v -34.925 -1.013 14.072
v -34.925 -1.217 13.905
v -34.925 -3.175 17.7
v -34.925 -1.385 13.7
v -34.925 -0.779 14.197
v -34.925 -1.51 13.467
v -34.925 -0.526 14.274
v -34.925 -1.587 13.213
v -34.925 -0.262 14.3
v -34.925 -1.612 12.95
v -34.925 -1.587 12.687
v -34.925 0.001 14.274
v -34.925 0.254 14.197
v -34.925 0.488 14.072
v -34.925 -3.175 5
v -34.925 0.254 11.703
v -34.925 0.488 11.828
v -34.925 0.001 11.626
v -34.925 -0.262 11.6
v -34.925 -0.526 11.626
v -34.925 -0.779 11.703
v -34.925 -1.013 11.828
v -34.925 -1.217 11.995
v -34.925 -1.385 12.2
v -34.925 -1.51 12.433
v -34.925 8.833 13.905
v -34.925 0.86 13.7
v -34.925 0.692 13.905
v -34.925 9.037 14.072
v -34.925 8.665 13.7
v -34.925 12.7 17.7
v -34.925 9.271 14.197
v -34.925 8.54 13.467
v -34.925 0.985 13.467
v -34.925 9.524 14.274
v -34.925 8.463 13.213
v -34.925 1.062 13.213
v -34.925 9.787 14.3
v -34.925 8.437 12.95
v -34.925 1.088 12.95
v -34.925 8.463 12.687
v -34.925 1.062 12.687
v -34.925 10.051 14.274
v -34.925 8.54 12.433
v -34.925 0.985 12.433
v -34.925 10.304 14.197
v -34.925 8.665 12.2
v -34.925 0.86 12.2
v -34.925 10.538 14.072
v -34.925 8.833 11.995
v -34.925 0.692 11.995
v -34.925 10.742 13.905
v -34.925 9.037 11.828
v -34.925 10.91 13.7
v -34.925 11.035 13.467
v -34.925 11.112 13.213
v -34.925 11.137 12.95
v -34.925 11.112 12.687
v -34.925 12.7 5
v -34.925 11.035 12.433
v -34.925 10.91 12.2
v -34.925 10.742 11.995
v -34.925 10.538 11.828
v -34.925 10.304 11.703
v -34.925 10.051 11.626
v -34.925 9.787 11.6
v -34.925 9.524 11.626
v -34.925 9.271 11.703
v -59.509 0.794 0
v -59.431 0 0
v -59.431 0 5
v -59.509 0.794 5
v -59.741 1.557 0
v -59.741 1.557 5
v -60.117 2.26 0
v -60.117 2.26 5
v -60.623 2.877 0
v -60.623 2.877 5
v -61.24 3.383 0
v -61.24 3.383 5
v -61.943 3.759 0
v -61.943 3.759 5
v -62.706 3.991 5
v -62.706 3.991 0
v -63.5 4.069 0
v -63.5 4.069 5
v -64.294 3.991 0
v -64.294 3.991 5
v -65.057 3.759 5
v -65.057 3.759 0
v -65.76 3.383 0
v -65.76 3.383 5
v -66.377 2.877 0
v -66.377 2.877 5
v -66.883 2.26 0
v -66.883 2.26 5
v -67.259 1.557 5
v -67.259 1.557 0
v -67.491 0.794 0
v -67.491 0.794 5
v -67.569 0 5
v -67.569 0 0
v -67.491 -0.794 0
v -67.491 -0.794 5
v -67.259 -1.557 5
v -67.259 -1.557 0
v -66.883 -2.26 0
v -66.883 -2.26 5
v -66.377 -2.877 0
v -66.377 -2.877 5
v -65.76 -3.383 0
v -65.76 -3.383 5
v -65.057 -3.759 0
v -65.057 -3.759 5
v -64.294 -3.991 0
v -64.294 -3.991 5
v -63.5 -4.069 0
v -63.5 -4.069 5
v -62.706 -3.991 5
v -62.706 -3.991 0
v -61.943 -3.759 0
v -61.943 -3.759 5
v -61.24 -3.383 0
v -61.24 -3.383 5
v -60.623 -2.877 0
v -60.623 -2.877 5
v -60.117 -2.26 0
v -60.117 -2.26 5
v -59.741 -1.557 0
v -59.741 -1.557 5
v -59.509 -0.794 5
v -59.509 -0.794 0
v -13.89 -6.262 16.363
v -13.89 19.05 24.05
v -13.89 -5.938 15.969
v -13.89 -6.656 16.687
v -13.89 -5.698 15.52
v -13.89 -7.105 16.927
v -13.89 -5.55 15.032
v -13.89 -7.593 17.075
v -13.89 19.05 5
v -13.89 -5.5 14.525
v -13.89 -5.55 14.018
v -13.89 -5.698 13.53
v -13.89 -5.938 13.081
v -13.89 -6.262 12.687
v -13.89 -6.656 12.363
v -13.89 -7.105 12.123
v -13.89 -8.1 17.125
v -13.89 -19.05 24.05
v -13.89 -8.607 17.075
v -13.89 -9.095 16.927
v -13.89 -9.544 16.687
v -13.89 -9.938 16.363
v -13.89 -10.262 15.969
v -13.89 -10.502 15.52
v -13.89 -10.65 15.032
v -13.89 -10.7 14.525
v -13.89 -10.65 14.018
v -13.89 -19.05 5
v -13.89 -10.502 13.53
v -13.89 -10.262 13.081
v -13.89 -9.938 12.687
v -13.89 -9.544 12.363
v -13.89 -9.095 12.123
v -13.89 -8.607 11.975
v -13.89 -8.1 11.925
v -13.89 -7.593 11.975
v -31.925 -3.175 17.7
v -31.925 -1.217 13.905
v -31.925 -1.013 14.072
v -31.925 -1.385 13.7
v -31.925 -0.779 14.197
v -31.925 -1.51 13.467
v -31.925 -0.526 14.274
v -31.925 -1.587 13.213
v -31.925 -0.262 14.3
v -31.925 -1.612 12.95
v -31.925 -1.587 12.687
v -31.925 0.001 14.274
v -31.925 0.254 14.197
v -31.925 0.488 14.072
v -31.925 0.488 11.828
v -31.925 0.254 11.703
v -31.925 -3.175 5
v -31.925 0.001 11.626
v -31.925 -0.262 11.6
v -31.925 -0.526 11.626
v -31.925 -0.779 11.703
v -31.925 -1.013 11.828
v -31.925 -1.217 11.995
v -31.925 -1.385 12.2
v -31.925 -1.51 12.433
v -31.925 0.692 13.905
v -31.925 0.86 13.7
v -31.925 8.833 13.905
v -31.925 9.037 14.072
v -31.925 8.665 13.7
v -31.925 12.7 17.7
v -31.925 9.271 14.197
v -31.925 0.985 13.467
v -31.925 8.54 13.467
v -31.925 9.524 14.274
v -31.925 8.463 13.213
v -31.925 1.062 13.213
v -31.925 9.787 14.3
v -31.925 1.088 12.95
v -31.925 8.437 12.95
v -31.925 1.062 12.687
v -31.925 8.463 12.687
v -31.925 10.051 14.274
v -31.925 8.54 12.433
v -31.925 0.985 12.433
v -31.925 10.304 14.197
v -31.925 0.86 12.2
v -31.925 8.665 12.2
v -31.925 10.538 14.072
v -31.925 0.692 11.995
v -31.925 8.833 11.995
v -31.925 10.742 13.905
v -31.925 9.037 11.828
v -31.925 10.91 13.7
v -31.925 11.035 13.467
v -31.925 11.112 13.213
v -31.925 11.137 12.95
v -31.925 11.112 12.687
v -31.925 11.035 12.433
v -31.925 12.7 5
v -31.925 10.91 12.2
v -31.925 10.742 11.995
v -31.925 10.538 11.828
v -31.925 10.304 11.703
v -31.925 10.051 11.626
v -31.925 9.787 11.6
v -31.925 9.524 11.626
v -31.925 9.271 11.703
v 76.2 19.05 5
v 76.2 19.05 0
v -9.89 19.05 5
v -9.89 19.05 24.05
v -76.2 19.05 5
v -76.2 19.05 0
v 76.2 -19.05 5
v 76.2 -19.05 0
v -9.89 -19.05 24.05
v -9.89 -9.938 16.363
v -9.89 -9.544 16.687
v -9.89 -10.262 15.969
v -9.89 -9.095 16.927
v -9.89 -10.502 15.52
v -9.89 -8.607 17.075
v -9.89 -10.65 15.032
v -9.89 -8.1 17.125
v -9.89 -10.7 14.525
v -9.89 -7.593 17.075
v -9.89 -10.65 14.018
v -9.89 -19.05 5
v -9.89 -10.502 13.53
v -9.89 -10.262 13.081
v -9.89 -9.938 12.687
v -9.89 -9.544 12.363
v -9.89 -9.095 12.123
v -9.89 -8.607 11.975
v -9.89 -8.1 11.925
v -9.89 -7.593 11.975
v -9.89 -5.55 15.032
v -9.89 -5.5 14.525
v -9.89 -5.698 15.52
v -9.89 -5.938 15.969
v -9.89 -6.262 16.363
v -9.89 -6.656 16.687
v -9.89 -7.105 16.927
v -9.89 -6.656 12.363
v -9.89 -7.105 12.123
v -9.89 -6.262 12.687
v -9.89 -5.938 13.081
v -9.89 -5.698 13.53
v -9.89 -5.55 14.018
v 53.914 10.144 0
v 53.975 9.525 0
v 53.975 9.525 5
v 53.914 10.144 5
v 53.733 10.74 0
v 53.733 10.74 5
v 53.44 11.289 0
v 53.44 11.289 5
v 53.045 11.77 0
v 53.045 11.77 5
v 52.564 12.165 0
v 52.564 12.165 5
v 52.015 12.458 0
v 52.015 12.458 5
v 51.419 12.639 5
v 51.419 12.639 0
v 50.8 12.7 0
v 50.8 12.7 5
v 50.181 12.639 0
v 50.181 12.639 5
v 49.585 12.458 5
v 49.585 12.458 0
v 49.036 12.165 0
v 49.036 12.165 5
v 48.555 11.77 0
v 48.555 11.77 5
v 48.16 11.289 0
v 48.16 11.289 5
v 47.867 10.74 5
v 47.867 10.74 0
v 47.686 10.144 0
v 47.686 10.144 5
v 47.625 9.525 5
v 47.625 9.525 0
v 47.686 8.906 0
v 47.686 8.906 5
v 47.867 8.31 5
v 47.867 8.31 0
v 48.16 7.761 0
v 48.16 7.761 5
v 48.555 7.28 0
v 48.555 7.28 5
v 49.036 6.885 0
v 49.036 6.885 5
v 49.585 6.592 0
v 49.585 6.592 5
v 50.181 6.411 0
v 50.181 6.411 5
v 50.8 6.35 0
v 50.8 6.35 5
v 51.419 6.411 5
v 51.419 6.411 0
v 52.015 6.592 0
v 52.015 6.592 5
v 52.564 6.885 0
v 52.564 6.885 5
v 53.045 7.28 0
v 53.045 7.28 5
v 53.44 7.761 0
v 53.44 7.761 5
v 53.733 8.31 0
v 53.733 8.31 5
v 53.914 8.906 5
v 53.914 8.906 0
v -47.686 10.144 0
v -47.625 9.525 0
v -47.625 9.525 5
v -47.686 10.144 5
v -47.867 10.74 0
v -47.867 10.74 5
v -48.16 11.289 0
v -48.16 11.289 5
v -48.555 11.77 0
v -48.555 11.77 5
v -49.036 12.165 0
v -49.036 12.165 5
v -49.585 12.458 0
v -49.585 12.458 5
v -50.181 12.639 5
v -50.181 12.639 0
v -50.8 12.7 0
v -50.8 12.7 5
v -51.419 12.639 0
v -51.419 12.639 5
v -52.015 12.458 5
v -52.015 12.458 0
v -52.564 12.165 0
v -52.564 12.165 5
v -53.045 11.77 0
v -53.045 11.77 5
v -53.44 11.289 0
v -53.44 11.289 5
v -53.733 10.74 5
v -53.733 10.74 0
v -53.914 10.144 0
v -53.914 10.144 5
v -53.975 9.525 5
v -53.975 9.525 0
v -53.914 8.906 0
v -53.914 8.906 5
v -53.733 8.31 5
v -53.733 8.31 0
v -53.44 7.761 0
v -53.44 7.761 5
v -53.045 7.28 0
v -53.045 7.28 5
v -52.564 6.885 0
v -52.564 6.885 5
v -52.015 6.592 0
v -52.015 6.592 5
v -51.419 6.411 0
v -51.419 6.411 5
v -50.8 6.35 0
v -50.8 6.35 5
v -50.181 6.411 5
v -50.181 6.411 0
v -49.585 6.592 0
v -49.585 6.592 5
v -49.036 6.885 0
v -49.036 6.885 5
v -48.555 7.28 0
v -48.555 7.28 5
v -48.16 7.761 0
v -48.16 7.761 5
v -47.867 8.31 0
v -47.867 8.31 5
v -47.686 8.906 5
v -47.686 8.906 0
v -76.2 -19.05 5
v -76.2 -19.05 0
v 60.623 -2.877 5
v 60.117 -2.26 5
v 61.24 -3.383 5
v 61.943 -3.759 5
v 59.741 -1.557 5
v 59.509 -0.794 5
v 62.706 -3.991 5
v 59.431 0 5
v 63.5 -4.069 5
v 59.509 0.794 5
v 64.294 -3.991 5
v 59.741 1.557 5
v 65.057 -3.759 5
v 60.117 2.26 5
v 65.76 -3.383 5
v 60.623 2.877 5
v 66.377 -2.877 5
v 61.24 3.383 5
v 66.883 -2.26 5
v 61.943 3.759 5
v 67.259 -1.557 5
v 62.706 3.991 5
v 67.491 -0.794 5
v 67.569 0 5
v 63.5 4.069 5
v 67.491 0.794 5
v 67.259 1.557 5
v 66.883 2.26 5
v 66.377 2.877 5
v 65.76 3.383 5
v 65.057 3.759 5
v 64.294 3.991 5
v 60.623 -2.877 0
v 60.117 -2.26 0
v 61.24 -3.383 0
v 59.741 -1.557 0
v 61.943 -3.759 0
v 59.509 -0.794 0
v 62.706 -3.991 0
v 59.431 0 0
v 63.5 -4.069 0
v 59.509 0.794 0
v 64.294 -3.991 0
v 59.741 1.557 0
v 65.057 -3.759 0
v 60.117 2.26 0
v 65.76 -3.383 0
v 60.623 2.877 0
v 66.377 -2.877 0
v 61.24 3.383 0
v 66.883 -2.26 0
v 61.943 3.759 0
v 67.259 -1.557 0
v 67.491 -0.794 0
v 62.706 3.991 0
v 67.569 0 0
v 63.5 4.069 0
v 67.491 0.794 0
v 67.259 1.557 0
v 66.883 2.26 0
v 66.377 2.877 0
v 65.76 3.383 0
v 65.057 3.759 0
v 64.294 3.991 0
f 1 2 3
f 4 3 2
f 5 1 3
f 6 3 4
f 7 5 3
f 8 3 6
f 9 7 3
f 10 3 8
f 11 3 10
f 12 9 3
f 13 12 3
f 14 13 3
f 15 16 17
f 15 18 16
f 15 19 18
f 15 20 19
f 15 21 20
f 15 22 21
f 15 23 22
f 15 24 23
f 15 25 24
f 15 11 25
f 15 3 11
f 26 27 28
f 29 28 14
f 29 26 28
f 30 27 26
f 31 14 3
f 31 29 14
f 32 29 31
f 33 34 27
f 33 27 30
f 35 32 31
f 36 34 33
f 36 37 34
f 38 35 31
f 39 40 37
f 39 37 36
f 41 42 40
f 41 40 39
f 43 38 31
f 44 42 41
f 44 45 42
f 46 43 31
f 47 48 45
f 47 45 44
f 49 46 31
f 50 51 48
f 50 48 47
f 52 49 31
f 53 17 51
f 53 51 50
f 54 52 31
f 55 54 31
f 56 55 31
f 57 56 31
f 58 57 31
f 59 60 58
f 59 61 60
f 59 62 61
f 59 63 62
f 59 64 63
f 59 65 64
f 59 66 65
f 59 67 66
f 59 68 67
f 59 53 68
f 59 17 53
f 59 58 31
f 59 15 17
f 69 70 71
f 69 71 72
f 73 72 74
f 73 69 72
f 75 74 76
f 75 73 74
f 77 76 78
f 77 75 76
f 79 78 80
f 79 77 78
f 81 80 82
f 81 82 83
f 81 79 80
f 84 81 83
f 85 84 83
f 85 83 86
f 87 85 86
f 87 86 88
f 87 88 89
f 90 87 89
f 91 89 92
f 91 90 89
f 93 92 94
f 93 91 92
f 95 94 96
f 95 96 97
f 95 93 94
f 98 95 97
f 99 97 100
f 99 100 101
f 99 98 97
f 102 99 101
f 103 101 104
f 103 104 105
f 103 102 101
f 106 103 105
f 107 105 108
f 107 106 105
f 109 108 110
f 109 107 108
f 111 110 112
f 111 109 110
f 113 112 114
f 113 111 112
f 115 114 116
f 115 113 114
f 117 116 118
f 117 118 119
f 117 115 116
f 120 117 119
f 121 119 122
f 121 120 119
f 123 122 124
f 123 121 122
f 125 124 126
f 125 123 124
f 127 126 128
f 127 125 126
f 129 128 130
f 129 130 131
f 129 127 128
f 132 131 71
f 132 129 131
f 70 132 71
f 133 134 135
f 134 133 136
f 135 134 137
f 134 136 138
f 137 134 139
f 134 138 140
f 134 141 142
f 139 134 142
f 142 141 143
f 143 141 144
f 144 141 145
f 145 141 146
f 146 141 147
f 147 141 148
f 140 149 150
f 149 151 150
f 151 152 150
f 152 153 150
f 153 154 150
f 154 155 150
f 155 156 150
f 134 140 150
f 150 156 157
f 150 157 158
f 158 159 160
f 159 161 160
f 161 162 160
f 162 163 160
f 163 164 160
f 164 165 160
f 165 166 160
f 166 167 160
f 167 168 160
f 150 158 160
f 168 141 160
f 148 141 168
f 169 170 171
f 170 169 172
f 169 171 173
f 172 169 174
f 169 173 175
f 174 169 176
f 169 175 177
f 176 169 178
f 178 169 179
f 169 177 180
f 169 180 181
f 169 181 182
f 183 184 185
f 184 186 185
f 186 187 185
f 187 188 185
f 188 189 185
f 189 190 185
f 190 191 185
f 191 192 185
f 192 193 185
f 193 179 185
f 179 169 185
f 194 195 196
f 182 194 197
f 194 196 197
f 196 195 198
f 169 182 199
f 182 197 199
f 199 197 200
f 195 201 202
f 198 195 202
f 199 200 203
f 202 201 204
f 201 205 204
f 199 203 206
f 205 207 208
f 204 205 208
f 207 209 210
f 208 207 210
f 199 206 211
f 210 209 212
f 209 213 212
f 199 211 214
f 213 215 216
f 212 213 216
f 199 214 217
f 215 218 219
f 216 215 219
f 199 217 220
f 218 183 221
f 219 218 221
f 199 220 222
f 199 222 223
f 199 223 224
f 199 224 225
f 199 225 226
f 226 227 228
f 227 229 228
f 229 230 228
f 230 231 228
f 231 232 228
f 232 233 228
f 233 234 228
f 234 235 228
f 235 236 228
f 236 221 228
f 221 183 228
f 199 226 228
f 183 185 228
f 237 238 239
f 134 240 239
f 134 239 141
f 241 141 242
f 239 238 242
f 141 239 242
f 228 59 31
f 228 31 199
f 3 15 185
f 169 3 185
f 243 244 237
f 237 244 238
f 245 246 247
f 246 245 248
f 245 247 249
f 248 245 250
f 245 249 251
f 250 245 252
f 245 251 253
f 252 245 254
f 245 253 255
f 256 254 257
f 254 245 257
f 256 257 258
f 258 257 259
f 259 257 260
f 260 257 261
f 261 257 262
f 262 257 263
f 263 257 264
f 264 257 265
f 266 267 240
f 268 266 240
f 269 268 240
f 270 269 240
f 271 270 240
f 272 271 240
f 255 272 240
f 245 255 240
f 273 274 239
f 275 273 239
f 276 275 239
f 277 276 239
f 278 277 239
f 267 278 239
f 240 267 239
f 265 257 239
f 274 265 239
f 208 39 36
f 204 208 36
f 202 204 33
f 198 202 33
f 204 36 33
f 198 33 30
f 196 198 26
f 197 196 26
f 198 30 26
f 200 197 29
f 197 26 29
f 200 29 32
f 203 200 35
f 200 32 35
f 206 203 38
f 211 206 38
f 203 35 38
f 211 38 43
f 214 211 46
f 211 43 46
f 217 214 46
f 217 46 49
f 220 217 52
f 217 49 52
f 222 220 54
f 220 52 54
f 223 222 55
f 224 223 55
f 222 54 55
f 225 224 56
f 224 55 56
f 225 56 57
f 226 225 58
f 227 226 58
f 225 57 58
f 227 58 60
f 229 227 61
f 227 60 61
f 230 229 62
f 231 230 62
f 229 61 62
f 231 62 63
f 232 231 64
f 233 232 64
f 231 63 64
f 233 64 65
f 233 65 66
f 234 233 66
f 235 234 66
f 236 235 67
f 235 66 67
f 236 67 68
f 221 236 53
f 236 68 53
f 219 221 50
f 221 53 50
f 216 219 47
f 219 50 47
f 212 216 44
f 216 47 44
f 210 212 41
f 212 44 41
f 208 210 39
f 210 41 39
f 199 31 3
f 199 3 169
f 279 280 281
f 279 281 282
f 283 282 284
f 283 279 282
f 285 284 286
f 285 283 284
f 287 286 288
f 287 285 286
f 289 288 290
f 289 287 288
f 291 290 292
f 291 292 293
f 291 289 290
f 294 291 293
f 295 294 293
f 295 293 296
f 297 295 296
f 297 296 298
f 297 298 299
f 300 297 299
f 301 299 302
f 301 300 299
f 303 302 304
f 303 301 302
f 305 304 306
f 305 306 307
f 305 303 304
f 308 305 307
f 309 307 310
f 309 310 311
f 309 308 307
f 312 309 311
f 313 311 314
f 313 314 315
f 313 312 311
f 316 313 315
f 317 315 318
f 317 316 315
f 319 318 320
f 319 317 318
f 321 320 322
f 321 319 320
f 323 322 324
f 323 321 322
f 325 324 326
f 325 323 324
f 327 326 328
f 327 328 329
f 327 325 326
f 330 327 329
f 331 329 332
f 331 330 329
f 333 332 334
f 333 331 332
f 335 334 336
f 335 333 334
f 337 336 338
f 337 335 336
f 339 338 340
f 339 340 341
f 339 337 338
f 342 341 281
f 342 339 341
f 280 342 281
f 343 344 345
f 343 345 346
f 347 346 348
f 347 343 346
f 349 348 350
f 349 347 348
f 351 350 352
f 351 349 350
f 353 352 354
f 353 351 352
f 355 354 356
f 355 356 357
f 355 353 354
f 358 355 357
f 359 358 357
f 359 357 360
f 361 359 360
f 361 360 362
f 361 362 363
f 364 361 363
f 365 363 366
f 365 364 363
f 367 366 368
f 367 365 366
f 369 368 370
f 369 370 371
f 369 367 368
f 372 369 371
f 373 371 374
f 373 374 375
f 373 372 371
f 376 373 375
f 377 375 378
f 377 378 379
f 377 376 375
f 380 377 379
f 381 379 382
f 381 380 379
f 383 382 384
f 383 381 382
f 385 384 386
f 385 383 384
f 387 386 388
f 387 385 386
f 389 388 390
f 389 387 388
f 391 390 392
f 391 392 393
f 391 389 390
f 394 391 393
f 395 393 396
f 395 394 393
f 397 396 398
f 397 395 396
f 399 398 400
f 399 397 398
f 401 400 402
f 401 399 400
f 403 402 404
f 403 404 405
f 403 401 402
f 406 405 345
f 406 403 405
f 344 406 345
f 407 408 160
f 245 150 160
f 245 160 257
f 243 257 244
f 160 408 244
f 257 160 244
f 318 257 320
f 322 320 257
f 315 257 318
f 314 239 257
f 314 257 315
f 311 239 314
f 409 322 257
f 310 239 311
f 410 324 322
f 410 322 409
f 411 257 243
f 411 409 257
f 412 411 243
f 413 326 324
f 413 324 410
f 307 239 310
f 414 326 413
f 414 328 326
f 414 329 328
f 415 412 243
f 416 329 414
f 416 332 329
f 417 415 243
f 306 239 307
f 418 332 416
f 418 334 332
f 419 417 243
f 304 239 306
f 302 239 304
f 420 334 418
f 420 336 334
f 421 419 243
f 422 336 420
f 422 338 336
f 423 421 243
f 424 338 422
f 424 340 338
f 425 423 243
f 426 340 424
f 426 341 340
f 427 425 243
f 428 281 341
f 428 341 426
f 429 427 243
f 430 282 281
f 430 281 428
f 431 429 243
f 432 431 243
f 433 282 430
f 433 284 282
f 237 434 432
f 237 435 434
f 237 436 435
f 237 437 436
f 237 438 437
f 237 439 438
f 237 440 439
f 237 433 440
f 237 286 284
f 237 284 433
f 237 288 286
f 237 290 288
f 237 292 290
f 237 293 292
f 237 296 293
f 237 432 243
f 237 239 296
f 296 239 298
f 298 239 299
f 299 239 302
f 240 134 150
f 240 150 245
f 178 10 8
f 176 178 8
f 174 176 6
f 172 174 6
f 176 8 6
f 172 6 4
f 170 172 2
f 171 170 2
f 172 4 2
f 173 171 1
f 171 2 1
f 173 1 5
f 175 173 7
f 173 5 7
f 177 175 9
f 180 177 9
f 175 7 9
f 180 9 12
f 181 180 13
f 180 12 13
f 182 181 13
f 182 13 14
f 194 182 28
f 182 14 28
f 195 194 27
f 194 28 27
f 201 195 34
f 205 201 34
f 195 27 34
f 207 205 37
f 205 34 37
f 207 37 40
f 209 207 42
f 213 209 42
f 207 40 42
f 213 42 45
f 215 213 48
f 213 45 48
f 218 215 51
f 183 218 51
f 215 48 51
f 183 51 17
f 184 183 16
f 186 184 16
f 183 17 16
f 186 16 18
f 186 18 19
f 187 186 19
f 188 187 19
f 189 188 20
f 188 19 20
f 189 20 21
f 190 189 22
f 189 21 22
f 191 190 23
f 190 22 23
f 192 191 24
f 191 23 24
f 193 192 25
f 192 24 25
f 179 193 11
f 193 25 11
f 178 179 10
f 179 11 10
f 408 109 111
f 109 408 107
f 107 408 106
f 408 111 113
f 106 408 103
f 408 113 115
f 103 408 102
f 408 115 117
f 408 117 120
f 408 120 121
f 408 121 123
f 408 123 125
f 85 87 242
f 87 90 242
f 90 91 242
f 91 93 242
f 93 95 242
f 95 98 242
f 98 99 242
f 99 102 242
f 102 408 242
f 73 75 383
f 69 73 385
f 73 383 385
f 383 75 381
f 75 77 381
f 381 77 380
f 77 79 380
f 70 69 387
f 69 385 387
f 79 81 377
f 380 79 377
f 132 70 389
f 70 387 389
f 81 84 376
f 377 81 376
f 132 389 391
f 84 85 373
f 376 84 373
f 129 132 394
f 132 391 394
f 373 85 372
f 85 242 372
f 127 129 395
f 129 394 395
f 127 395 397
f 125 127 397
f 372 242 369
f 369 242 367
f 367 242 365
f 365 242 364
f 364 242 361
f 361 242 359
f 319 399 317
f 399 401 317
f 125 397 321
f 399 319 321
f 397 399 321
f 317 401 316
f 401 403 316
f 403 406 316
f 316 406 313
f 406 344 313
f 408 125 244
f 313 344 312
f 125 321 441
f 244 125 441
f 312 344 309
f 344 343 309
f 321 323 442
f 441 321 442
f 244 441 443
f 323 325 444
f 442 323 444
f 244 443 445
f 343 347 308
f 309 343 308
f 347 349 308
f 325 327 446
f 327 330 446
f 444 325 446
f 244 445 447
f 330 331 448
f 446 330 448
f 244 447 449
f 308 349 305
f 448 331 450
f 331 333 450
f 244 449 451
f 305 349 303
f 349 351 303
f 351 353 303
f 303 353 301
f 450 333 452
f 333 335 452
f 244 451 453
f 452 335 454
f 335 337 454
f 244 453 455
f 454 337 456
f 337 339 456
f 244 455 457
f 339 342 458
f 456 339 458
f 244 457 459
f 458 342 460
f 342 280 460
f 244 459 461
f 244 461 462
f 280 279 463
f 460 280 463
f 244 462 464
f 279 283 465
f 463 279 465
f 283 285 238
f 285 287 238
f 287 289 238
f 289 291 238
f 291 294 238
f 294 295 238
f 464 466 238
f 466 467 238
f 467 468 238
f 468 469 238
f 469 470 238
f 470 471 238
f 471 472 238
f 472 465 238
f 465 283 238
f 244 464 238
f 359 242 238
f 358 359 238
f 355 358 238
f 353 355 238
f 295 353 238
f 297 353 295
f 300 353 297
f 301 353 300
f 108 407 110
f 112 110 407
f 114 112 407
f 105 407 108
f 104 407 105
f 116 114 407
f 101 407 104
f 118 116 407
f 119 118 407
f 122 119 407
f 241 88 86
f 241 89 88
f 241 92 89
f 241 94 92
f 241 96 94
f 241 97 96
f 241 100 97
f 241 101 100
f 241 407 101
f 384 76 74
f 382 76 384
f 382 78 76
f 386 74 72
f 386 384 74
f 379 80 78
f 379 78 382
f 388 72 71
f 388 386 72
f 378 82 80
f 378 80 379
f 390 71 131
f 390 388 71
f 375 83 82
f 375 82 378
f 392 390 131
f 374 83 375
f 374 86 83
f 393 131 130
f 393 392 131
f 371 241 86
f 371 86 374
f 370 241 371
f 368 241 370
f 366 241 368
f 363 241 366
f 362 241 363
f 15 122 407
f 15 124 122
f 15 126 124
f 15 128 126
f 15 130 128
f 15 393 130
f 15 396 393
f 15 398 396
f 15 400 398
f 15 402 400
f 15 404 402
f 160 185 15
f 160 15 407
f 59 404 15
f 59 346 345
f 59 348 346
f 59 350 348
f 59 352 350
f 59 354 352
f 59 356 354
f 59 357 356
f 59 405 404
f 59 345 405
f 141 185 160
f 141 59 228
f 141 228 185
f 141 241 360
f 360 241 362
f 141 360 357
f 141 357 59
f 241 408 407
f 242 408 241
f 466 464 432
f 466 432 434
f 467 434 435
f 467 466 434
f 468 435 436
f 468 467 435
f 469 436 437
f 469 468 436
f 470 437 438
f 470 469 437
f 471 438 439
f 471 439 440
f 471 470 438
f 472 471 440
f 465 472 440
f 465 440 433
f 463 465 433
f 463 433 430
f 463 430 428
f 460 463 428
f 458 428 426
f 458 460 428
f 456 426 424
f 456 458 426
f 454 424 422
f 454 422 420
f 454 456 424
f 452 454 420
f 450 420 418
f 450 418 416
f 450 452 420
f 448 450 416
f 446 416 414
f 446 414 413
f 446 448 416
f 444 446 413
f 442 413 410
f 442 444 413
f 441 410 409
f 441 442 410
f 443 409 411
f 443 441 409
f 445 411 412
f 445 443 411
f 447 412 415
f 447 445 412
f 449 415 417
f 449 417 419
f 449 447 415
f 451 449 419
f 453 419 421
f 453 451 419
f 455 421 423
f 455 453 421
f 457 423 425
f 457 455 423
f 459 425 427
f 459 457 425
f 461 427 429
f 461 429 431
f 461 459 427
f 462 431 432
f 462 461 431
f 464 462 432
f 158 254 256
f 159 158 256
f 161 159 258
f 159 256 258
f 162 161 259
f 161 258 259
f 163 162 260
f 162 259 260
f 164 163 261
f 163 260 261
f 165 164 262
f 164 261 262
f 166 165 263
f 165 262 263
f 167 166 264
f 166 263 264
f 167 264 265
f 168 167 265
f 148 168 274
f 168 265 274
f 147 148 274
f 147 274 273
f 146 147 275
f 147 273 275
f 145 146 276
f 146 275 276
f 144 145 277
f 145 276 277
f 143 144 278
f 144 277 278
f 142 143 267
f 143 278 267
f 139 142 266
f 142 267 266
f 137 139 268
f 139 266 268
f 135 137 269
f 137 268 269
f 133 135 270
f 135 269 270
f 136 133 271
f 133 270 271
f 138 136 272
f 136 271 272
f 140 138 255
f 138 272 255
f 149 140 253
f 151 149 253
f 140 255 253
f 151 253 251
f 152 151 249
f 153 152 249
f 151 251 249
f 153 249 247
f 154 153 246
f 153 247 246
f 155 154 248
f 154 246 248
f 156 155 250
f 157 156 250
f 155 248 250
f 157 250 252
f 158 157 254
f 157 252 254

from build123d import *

# Parameters (mm, degrees)
F0_W     = 76.2
F0_H     = 38.1
F0_R     = 4.06875
F0_R_2   = 3.175
F1_DEPTH = 5
F2_W     = 4
F2_H     = 19.05
F3_DEPTH = 19.05
F4_W     = 3
F4_H     = 15.875
F5_DEPTH = 12.7
F7_DEPTH = 4
F8_R     = 1.349997
F9_DEPTH = 3


with BuildPart() as f1:
    # F0 (on Top) → F1 (new body)
    with BuildSketch(Plane.XY):
        with Locations((38.1, 0)):
            Rectangle(F0_W, F0_H)
        with Locations((63.5, 0)):
            Circle(F0_R, mode=Mode.SUBTRACT)
        with Locations((50.8, 9.525)):
            Circle(F0_R_2, mode=Mode.SUBTRACT)
        with Locations((-38.1, 0)):
            Rectangle(F0_W, F0_H)
        with Locations((-63.5, 0)):
            Circle(F0_R, mode=Mode.SUBTRACT)
        with Locations((-50.8, 9.525)):
            Circle(F0_R_2, mode=Mode.SUBTRACT)
    extrude(amount=F1_DEPTH)

    # F2 (on face) → F3 (join)
    with BuildSketch(Plane.XY.offset(5)):
        with Locations((-11.89, 9.525)):
            Rectangle(F2_W, F2_H)
        with Locations((-11.89, -9.525)):
            Rectangle(F2_W, F2_H)
    extrude(amount=F3_DEPTH)

    # F4 (on face) → F5 (join)
    with BuildSketch(Plane.XY.offset(5)):
        with Locations((-33.425, 4.7625)):
            Rectangle(F4_W, F4_H)
    extrude(amount=F5_DEPTH)

    # F6 (on face) → F7 (cut, through all)
    with BuildSketch(Plane.YZ.offset(-9.89)):
        with BuildLine():
            Line((-8.099996, 14.525), (-5.499996, 14.525))
            ThreePointArc((-5.499996, 14.525), (-8.099996, 17.125), (-10.699996, 14.525))
            Line((-10.699996, 14.525), (-8.099996, 14.525))
        make_face()
        with BuildLine():
            ThreePointArc((-10.699996, 14.525), (-8.099996, 11.925), (-5.499996, 14.525))
            Line((-5.499996, 14.525), (-8.099996, 14.525))
            Line((-8.099996, 14.525), (-10.699996, 14.525))
        make_face()
    extrude(amount=-F7_DEPTH, mode=Mode.SUBTRACT)

    # F8 (on face) → F9 (cut, through all)
    with BuildSketch(Plane(origin=(-34.925, 0, 0), x_dir=(0, -1, 0), z_dir=(-1, 0, 0))):
        with Locations((-9.787496, 12.949984)):
            Circle(F8_R)
        with Locations((0.262496, 12.949984)):
            Circle(F8_R)
    extrude(amount=-F9_DEPTH, mode=Mode.SUBTRACT)


solid = f1.part
